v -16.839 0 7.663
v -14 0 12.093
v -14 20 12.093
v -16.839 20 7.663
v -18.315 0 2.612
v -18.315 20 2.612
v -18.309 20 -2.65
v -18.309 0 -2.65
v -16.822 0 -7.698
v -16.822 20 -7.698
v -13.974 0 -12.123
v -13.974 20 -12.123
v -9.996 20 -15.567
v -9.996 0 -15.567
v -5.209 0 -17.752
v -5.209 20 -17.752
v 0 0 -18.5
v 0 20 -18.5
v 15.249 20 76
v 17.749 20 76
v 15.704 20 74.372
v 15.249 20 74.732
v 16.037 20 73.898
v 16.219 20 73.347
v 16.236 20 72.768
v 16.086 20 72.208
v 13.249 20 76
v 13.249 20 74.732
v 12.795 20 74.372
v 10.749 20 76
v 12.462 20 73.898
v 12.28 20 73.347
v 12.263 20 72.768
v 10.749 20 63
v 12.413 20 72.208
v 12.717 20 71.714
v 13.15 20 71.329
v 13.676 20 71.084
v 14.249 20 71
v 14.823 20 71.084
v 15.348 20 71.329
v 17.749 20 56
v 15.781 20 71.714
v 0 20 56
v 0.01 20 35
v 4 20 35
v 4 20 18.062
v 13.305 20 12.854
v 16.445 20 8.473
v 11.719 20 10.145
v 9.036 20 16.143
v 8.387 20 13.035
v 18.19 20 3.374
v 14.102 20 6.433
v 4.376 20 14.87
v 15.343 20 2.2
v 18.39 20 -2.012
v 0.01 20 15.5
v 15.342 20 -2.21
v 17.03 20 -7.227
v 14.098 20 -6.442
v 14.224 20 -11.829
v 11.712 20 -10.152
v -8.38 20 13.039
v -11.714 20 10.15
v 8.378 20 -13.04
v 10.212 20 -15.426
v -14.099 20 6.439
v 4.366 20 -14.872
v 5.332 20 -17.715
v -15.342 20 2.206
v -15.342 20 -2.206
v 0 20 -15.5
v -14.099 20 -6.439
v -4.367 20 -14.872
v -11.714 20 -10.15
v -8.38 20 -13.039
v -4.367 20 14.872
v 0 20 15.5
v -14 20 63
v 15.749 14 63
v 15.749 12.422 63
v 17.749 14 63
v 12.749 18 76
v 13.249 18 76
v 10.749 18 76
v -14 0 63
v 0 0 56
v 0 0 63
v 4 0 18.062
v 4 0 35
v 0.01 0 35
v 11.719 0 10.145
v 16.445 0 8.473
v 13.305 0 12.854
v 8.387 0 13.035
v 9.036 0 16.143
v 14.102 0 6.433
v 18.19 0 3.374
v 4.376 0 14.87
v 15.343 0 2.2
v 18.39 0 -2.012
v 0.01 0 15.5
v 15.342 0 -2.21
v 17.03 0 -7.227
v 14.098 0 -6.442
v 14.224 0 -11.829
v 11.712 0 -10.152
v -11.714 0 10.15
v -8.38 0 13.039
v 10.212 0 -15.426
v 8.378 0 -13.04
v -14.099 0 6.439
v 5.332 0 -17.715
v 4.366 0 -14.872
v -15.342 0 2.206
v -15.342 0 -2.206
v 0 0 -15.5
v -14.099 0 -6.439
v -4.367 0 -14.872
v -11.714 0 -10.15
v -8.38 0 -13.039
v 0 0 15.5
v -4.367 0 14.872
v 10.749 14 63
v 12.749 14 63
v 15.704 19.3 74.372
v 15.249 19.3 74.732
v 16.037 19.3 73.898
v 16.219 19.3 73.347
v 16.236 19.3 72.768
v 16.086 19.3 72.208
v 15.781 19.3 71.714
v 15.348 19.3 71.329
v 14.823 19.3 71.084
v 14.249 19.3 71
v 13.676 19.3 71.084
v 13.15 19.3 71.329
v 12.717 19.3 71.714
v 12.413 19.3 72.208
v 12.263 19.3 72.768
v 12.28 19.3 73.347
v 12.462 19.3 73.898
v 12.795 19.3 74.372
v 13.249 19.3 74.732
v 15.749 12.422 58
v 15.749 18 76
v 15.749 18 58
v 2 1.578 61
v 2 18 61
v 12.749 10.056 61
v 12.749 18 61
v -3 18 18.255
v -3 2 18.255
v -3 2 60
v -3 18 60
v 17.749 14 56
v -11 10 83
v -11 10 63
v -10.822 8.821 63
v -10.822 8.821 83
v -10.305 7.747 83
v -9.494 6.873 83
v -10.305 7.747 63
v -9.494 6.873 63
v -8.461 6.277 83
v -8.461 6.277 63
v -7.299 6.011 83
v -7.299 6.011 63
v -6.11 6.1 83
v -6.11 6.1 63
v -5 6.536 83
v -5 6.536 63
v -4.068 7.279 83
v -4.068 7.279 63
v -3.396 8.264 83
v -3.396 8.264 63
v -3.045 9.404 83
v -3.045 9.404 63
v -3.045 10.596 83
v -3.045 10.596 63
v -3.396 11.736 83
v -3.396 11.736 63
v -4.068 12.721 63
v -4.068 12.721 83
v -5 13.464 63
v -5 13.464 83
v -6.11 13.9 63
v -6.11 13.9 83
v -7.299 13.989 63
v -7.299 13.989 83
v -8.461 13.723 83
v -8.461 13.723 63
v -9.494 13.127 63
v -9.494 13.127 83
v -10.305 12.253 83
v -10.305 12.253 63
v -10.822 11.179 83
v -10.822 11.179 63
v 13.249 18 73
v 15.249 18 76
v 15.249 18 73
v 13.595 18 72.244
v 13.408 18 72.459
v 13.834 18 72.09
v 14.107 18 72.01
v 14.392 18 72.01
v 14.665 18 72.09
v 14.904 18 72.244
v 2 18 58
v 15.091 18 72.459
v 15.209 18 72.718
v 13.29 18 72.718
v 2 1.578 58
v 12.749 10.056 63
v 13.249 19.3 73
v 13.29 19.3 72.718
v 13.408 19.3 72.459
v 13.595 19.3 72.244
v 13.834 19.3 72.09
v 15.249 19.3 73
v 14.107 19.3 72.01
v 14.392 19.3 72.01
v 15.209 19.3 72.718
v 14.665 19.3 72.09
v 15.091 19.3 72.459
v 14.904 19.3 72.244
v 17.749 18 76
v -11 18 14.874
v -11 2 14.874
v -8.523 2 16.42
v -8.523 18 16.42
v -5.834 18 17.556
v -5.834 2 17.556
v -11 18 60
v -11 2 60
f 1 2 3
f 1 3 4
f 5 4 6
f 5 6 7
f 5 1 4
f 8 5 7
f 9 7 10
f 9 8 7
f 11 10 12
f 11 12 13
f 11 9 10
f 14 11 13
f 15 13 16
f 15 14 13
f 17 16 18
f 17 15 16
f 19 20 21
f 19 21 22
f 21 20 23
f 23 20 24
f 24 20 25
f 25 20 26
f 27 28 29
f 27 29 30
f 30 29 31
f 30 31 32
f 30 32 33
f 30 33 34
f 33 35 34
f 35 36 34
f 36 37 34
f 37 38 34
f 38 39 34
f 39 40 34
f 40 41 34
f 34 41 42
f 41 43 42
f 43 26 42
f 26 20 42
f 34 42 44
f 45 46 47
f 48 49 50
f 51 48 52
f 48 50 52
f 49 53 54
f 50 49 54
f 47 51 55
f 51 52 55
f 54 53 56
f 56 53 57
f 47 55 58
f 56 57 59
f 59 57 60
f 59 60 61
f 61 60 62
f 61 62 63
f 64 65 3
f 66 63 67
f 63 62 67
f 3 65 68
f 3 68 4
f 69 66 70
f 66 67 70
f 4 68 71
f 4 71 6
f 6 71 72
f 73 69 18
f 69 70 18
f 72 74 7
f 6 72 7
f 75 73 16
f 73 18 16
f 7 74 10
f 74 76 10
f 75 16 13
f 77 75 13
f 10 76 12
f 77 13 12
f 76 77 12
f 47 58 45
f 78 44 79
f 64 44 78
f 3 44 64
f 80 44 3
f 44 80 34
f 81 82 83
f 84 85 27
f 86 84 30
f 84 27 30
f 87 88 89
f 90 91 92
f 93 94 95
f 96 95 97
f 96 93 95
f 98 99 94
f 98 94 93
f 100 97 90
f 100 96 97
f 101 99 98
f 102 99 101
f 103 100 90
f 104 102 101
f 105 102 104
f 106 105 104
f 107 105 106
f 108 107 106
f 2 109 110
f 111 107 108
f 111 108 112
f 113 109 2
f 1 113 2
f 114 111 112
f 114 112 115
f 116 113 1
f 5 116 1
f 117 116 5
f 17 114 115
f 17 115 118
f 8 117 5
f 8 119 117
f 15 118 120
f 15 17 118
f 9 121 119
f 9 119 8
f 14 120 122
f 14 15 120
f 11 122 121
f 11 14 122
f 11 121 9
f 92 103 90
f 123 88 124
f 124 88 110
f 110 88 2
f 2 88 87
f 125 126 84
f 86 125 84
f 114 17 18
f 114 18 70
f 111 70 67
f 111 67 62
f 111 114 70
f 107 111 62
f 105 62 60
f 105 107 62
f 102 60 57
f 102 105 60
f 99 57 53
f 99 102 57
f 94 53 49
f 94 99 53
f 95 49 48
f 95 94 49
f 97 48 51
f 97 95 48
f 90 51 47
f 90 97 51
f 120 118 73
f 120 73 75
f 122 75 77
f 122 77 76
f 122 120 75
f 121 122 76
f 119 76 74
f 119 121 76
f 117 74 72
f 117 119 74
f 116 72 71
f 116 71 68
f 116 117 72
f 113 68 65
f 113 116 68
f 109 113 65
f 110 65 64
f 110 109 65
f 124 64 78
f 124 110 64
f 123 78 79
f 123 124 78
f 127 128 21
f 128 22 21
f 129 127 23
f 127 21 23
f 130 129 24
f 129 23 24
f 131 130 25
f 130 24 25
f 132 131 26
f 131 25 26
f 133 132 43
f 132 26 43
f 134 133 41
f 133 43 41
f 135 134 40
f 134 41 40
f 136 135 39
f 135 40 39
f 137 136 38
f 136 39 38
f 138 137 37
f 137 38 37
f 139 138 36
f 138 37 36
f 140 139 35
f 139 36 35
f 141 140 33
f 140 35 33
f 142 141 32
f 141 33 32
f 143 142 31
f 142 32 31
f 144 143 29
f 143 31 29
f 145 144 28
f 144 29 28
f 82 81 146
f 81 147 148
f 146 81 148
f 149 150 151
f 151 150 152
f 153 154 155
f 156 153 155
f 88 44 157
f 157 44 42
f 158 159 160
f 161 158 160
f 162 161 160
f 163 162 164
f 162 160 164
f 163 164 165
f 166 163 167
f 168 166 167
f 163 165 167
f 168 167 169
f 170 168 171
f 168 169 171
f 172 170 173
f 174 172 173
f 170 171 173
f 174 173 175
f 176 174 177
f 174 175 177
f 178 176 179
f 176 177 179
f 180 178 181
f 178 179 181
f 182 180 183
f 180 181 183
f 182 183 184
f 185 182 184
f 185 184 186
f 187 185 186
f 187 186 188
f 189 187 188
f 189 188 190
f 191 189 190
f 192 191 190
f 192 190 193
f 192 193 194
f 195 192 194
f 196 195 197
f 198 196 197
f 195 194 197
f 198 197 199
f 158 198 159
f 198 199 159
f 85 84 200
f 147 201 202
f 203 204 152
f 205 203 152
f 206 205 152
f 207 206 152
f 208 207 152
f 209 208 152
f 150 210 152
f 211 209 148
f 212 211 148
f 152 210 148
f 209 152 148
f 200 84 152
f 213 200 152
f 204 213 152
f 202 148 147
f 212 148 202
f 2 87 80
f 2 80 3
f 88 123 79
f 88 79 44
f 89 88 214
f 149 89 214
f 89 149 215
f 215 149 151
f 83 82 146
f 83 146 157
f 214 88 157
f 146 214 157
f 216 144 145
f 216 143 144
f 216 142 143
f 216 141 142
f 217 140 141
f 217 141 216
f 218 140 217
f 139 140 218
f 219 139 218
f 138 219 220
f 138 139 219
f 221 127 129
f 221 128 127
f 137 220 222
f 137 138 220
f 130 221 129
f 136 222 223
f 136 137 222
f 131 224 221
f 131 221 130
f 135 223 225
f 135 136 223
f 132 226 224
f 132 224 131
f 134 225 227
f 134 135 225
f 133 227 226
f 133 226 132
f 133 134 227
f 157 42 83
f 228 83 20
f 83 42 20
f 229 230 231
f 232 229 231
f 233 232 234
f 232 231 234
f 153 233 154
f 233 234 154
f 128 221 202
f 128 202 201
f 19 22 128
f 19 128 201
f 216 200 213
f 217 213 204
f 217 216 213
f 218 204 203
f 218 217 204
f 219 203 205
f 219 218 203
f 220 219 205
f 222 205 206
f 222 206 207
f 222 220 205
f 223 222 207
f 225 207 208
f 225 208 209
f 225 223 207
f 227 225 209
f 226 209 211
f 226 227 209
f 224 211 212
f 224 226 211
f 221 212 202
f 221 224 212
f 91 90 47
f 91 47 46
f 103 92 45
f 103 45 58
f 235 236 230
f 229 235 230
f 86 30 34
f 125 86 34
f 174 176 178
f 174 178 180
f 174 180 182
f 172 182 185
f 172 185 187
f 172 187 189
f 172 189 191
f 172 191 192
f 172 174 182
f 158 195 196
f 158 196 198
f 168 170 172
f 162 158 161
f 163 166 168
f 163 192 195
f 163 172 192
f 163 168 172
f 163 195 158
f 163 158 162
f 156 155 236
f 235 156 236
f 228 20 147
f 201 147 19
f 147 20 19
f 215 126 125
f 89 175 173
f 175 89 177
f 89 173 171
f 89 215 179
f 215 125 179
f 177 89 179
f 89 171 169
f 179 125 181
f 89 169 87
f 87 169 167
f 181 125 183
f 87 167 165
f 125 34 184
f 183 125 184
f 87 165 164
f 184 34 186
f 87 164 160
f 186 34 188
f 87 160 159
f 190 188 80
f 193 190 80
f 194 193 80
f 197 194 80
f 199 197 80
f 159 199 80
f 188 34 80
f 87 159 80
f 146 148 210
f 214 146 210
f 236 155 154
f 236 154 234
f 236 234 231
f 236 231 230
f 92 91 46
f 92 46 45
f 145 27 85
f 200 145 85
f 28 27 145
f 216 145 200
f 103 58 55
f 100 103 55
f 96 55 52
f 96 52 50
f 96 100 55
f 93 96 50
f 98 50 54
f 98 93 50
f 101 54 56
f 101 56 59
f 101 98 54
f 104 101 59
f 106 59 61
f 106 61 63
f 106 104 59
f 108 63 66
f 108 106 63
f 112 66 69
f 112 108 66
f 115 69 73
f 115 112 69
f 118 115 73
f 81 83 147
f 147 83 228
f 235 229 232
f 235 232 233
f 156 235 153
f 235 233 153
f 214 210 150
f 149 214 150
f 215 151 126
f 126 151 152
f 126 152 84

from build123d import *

# Parameters (mm, degrees)
BOSS_EXTRUDE1_DEPTH = 20
SKETCH2_R           = 4
BOSS_EXTRUDE2_DEPTH = 20
BOSS_EXTRUDE3_DEPTH = 2
BOSS_EXTRUDE4_DEPTH = 18
CUT_EXTRUDE1_DEPTH  = 22
BOSS_EXTRUDE5_DEPTH = 2
SKETCH8_R           = 2
CUT_EXTRUDE3_DEPTH  = 0.7
CUT_EXTRUDE2_REACH  = 94.752
SKETCH6_W           = 19.696996452
SKETCH6_H           = 13.58493718
CUT_EXTRUDE4_REACH  = 94.752
BOSS_EXTRUDE6_START = -2
BOSS_EXTRUDE6_DEPTH = 2
BOSS_EXTRUDE7_DEPTH = 2
BOSS_EXTRUDE8_START = -20
BOSS_EXTRUDE8_DEPTH = 20


with BuildPart() as part:
    # Sketch1 → Boss-Extrude1 (new body)
    with BuildSketch(Plane(origin=(0, 0, 0), x_dir=(1, 0, 0), z_dir=(0, 1, 0))):
        with BuildLine():
            Line((0, -15.5), (0, -63))
            Line((0, -63), (-14, -63))
            Line((-14, -63), (-14, -12.093386622))
            ThreePointArc((-14, -12.093386622), (-16.822271733, 7.698127938), (0, 18.5))
            Line((0, 18.5), (0, 15.5))
            ThreePointArc((0, 15.5), (-15.5, 0), (0, -15.5))
        make_face()
        with BuildLine():
            Line((-11, -60), (-11, -14.874474781))
            ThreePointArc((-11, -14.874474781), (-7.201195596, -17.04091494), (-3, -18.255136264))
            Line((-3, -18.255136264), (-3, -60))
            Line((-3, -60), (-11, -60))
        make_face(mode=Mode.SUBTRACT)
    extrude(amount=BOSS_EXTRUDE1_DEPTH)

    # Sketch2 → Boss-Extrude2 (add)
    with BuildSketch(Plane.XY.offset(63)):
        with Locations(Location((-7, 10, 0), (0, 0, 180))):
            Circle(SKETCH2_R)
    extrude(amount=BOSS_EXTRUDE2_DEPTH)

    # Sketch3 → Boss-Extrude3 (add)
    with BuildSketch(Plane(origin=(0, 20, 0), x_dir=(1, 0, 0), z_dir=(0, 1, 0))):
        with BuildLine():
            Line((0, -63), (10.749394376, -63))
            Line((10.749394376, -63), (10.749394376, -76))
            Line((10.749394376, -76), (13.249394376, -76))
            Line((13.249394376, -76), (13.249394376, -73))
            ThreePointArc((13.249394376, -73), (14.249394376, -72), (15.249394376, -73))
            Line((15.249394376, -73), (15.249394376, -76))
            Line((15.249394376, -76), (17.749394376, -76))
            Line((17.749394376, -76), (17.749394376, -56))
            Line((17.749394376, -56), (0, -56))
            Line((0, -56), (0, -63))
        make_face()
        Polygon((2, -58), (15.749394376, -58), (15.749394376, -69), (12.749394376, -69), (12.749394376, -61), (2, -61), align=None, mode=Mode.SUBTRACT)
    extrude(amount=-BOSS_EXTRUDE3_DEPTH)

    # Sketch4 → Boss-Extrude4 (add)
    with BuildSketch(Plane.XZ.offset(-18)):
        Polygon((15.749394376, 69), (15.749394376, 58), (2, 58), (2, 61), (12.749394376, 61), (12.749394376, 69), (12.749394376, 76), (10.749394376, 76), (10.749394376, 66), (10.749394376, 63), (0, 63), (0, 56), (17.749394376, 56), (17.749394376, 66), (17.749394376, 76), (15.749394376, 76), align=None)
    extrude(amount=BOSS_EXTRUDE4_DEPTH)

    # Sketch5 → Cut-Extrude1 (cut)
    with BuildSketch(Plane(origin=(0, 0, 56), x_dir=(-1, 0, 0), z_dir=(0, 0, -1))):
        Polygon((0, 0), (-17.749394376, 14), (-17.749394376, -1.554529852), (0, -1.554529852), align=None)
    extrude(amount=-CUT_EXTRUDE1_DEPTH, mode=Mode.SUBTRACT)

    # Sketch7 → Boss-Extrude5 (add)
    with BuildSketch(Plane(origin=(0, 20, 0), x_dir=(1, 0, 0), z_dir=(0, 1, 0))):
        Polygon((2, -61), (12.749394376, -61), (12.749394376, -69), (15.749394376, -69), (15.749394376, -58), (2, -58), align=None)
    extrude(amount=-BOSS_EXTRUDE5_DEPTH)

    # Sketch8 → Cut-Extrude3 (cut)
    with BuildSketch(Plane(origin=(0, 20, 0), x_dir=(1, 0, 0), z_dir=(0, 1, 0))):
        with Locations((14.249394376, -73)):
            Circle(SKETCH8_R)
    extrude(amount=-CUT_EXTRUDE3_DEPTH, mode=Mode.SUBTRACT)

    # Cut-Extrude2: up to this face of the body (flat: up to its plane)
    cut_extrude2_end = Plane(part.part.faces().sort_by_distance((10.749394376, 14.239342427, 69.5))[0])
    # Sketch6 → Cut-Extrude2 (cut, up to the picked face)
    with BuildSketch(Plane(origin=(17.749394376, 0, 0), x_dir=(0, 0, -1), z_dir=(1, 0, 0)), mode=Mode.PRIVATE) as cut_extrude2_sk1:
        with Locations((-72.848498226, 7.20753141)):
            Rectangle(SKETCH6_W, SKETCH6_H)
    cut_extrude2_tool1 = split(extrude(cut_extrude2_sk1.sketch, amount=-CUT_EXTRUDE2_REACH, mode=Mode.PRIVATE), bisect_by=cut_extrude2_end, keep=Keep.BOTH, mode=Mode.PRIVATE)
    add(cut_extrude2_tool1.solids().sort_by(Axis((17.749394, 7.207531, 72.848498), (-1, 0, 0)))[0], mode=Mode.SUBTRACT)

    # Cut-Extrude4: up to this face of the body (flat: up to its plane)
    cut_extrude4_end = Plane(part.part.faces().sort_by_distance((10.749394376, 17, 69.5))[0])
    # Sketch10 → Cut-Extrude4 (cut, up to the picked face)
    with BuildSketch(Plane(origin=(17.749394376, 0, 0), x_dir=(0, 0, -1), z_dir=(1, 0, 0)), mode=Mode.PRIVATE) as cut_extrude4_sk1:
        Polygon((-63, 14), (-76, 18), (-76, 12.216867542), (-63, 12.216867542), align=None)
    cut_extrude4_tool1 = split(extrude(cut_extrude4_sk1.sketch, amount=-CUT_EXTRUDE4_REACH, mode=Mode.PRIVATE), bisect_by=cut_extrude4_end, keep=Keep.BOTH, mode=Mode.PRIVATE)
    add(cut_extrude4_tool1.solids().sort_by(Axis((17.749394, 14.284655, 70.645435), (-1, 0, 0)))[0], mode=Mode.SUBTRACT)

    # Sketch11 → Boss-Extrude6 (add)
    with BuildSketch(Plane(origin=(0, 20, 0), x_dir=(1, 0, 0), z_dir=(0, 1, 0)).offset(BOSS_EXTRUDE6_START)):
        with BuildLine():
            Line((-11, -14.874474781), (-11, -60))
            Line((-11, -60), (-3, -60))
            Line((-3, -60), (-3, -18.255136264))
            ThreePointArc((-3, -18.255136264), (-7.201195596, -17.04091494), (-11, -14.874474781))
        make_face()
    extrude(amount=BOSS_EXTRUDE6_DEPTH)

    # Sketch12 → Boss-Extrude7 (add)
    with BuildSketch(Plane.XZ):
        with BuildLine():
            Line((-3, 60), (-3, 18.255136264))
            ThreePointArc((-3, 18.255136264), (-7.201195596, 17.04091494), (-11, 14.874474781))
            Line((-11, 14.874474781), (-11, 60))
            Line((-11, 60), (-3, 60))
        make_face()
    extrude(amount=-BOSS_EXTRUDE7_DEPTH)

    # Sketch13 → Boss-Extrude8 (add)
    with BuildSketch(Plane(origin=(0, 20, 0), x_dir=(1, 0, 0), z_dir=(0, 1, 0)).offset(BOSS_EXTRUDE8_START)):
        with BuildLine():
            Line((0, 15.5), (0, 18.5))
            ThreePointArc((0, 18.5), (18.390272559, 2.011933204), (4, -18.062391868))
            Line((4, -18.062391868), (4, -35))
            Line((4, -35), (0.01, -35))
            Line((0.01, -35), (0.01, -15.499996774))
            ThreePointArc((0.01, -15.499996774), (15.499999194, 0.005), (0, 15.5))
        make_face()
    extrude(amount=BOSS_EXTRUDE8_DEPTH)


solid = part.part
